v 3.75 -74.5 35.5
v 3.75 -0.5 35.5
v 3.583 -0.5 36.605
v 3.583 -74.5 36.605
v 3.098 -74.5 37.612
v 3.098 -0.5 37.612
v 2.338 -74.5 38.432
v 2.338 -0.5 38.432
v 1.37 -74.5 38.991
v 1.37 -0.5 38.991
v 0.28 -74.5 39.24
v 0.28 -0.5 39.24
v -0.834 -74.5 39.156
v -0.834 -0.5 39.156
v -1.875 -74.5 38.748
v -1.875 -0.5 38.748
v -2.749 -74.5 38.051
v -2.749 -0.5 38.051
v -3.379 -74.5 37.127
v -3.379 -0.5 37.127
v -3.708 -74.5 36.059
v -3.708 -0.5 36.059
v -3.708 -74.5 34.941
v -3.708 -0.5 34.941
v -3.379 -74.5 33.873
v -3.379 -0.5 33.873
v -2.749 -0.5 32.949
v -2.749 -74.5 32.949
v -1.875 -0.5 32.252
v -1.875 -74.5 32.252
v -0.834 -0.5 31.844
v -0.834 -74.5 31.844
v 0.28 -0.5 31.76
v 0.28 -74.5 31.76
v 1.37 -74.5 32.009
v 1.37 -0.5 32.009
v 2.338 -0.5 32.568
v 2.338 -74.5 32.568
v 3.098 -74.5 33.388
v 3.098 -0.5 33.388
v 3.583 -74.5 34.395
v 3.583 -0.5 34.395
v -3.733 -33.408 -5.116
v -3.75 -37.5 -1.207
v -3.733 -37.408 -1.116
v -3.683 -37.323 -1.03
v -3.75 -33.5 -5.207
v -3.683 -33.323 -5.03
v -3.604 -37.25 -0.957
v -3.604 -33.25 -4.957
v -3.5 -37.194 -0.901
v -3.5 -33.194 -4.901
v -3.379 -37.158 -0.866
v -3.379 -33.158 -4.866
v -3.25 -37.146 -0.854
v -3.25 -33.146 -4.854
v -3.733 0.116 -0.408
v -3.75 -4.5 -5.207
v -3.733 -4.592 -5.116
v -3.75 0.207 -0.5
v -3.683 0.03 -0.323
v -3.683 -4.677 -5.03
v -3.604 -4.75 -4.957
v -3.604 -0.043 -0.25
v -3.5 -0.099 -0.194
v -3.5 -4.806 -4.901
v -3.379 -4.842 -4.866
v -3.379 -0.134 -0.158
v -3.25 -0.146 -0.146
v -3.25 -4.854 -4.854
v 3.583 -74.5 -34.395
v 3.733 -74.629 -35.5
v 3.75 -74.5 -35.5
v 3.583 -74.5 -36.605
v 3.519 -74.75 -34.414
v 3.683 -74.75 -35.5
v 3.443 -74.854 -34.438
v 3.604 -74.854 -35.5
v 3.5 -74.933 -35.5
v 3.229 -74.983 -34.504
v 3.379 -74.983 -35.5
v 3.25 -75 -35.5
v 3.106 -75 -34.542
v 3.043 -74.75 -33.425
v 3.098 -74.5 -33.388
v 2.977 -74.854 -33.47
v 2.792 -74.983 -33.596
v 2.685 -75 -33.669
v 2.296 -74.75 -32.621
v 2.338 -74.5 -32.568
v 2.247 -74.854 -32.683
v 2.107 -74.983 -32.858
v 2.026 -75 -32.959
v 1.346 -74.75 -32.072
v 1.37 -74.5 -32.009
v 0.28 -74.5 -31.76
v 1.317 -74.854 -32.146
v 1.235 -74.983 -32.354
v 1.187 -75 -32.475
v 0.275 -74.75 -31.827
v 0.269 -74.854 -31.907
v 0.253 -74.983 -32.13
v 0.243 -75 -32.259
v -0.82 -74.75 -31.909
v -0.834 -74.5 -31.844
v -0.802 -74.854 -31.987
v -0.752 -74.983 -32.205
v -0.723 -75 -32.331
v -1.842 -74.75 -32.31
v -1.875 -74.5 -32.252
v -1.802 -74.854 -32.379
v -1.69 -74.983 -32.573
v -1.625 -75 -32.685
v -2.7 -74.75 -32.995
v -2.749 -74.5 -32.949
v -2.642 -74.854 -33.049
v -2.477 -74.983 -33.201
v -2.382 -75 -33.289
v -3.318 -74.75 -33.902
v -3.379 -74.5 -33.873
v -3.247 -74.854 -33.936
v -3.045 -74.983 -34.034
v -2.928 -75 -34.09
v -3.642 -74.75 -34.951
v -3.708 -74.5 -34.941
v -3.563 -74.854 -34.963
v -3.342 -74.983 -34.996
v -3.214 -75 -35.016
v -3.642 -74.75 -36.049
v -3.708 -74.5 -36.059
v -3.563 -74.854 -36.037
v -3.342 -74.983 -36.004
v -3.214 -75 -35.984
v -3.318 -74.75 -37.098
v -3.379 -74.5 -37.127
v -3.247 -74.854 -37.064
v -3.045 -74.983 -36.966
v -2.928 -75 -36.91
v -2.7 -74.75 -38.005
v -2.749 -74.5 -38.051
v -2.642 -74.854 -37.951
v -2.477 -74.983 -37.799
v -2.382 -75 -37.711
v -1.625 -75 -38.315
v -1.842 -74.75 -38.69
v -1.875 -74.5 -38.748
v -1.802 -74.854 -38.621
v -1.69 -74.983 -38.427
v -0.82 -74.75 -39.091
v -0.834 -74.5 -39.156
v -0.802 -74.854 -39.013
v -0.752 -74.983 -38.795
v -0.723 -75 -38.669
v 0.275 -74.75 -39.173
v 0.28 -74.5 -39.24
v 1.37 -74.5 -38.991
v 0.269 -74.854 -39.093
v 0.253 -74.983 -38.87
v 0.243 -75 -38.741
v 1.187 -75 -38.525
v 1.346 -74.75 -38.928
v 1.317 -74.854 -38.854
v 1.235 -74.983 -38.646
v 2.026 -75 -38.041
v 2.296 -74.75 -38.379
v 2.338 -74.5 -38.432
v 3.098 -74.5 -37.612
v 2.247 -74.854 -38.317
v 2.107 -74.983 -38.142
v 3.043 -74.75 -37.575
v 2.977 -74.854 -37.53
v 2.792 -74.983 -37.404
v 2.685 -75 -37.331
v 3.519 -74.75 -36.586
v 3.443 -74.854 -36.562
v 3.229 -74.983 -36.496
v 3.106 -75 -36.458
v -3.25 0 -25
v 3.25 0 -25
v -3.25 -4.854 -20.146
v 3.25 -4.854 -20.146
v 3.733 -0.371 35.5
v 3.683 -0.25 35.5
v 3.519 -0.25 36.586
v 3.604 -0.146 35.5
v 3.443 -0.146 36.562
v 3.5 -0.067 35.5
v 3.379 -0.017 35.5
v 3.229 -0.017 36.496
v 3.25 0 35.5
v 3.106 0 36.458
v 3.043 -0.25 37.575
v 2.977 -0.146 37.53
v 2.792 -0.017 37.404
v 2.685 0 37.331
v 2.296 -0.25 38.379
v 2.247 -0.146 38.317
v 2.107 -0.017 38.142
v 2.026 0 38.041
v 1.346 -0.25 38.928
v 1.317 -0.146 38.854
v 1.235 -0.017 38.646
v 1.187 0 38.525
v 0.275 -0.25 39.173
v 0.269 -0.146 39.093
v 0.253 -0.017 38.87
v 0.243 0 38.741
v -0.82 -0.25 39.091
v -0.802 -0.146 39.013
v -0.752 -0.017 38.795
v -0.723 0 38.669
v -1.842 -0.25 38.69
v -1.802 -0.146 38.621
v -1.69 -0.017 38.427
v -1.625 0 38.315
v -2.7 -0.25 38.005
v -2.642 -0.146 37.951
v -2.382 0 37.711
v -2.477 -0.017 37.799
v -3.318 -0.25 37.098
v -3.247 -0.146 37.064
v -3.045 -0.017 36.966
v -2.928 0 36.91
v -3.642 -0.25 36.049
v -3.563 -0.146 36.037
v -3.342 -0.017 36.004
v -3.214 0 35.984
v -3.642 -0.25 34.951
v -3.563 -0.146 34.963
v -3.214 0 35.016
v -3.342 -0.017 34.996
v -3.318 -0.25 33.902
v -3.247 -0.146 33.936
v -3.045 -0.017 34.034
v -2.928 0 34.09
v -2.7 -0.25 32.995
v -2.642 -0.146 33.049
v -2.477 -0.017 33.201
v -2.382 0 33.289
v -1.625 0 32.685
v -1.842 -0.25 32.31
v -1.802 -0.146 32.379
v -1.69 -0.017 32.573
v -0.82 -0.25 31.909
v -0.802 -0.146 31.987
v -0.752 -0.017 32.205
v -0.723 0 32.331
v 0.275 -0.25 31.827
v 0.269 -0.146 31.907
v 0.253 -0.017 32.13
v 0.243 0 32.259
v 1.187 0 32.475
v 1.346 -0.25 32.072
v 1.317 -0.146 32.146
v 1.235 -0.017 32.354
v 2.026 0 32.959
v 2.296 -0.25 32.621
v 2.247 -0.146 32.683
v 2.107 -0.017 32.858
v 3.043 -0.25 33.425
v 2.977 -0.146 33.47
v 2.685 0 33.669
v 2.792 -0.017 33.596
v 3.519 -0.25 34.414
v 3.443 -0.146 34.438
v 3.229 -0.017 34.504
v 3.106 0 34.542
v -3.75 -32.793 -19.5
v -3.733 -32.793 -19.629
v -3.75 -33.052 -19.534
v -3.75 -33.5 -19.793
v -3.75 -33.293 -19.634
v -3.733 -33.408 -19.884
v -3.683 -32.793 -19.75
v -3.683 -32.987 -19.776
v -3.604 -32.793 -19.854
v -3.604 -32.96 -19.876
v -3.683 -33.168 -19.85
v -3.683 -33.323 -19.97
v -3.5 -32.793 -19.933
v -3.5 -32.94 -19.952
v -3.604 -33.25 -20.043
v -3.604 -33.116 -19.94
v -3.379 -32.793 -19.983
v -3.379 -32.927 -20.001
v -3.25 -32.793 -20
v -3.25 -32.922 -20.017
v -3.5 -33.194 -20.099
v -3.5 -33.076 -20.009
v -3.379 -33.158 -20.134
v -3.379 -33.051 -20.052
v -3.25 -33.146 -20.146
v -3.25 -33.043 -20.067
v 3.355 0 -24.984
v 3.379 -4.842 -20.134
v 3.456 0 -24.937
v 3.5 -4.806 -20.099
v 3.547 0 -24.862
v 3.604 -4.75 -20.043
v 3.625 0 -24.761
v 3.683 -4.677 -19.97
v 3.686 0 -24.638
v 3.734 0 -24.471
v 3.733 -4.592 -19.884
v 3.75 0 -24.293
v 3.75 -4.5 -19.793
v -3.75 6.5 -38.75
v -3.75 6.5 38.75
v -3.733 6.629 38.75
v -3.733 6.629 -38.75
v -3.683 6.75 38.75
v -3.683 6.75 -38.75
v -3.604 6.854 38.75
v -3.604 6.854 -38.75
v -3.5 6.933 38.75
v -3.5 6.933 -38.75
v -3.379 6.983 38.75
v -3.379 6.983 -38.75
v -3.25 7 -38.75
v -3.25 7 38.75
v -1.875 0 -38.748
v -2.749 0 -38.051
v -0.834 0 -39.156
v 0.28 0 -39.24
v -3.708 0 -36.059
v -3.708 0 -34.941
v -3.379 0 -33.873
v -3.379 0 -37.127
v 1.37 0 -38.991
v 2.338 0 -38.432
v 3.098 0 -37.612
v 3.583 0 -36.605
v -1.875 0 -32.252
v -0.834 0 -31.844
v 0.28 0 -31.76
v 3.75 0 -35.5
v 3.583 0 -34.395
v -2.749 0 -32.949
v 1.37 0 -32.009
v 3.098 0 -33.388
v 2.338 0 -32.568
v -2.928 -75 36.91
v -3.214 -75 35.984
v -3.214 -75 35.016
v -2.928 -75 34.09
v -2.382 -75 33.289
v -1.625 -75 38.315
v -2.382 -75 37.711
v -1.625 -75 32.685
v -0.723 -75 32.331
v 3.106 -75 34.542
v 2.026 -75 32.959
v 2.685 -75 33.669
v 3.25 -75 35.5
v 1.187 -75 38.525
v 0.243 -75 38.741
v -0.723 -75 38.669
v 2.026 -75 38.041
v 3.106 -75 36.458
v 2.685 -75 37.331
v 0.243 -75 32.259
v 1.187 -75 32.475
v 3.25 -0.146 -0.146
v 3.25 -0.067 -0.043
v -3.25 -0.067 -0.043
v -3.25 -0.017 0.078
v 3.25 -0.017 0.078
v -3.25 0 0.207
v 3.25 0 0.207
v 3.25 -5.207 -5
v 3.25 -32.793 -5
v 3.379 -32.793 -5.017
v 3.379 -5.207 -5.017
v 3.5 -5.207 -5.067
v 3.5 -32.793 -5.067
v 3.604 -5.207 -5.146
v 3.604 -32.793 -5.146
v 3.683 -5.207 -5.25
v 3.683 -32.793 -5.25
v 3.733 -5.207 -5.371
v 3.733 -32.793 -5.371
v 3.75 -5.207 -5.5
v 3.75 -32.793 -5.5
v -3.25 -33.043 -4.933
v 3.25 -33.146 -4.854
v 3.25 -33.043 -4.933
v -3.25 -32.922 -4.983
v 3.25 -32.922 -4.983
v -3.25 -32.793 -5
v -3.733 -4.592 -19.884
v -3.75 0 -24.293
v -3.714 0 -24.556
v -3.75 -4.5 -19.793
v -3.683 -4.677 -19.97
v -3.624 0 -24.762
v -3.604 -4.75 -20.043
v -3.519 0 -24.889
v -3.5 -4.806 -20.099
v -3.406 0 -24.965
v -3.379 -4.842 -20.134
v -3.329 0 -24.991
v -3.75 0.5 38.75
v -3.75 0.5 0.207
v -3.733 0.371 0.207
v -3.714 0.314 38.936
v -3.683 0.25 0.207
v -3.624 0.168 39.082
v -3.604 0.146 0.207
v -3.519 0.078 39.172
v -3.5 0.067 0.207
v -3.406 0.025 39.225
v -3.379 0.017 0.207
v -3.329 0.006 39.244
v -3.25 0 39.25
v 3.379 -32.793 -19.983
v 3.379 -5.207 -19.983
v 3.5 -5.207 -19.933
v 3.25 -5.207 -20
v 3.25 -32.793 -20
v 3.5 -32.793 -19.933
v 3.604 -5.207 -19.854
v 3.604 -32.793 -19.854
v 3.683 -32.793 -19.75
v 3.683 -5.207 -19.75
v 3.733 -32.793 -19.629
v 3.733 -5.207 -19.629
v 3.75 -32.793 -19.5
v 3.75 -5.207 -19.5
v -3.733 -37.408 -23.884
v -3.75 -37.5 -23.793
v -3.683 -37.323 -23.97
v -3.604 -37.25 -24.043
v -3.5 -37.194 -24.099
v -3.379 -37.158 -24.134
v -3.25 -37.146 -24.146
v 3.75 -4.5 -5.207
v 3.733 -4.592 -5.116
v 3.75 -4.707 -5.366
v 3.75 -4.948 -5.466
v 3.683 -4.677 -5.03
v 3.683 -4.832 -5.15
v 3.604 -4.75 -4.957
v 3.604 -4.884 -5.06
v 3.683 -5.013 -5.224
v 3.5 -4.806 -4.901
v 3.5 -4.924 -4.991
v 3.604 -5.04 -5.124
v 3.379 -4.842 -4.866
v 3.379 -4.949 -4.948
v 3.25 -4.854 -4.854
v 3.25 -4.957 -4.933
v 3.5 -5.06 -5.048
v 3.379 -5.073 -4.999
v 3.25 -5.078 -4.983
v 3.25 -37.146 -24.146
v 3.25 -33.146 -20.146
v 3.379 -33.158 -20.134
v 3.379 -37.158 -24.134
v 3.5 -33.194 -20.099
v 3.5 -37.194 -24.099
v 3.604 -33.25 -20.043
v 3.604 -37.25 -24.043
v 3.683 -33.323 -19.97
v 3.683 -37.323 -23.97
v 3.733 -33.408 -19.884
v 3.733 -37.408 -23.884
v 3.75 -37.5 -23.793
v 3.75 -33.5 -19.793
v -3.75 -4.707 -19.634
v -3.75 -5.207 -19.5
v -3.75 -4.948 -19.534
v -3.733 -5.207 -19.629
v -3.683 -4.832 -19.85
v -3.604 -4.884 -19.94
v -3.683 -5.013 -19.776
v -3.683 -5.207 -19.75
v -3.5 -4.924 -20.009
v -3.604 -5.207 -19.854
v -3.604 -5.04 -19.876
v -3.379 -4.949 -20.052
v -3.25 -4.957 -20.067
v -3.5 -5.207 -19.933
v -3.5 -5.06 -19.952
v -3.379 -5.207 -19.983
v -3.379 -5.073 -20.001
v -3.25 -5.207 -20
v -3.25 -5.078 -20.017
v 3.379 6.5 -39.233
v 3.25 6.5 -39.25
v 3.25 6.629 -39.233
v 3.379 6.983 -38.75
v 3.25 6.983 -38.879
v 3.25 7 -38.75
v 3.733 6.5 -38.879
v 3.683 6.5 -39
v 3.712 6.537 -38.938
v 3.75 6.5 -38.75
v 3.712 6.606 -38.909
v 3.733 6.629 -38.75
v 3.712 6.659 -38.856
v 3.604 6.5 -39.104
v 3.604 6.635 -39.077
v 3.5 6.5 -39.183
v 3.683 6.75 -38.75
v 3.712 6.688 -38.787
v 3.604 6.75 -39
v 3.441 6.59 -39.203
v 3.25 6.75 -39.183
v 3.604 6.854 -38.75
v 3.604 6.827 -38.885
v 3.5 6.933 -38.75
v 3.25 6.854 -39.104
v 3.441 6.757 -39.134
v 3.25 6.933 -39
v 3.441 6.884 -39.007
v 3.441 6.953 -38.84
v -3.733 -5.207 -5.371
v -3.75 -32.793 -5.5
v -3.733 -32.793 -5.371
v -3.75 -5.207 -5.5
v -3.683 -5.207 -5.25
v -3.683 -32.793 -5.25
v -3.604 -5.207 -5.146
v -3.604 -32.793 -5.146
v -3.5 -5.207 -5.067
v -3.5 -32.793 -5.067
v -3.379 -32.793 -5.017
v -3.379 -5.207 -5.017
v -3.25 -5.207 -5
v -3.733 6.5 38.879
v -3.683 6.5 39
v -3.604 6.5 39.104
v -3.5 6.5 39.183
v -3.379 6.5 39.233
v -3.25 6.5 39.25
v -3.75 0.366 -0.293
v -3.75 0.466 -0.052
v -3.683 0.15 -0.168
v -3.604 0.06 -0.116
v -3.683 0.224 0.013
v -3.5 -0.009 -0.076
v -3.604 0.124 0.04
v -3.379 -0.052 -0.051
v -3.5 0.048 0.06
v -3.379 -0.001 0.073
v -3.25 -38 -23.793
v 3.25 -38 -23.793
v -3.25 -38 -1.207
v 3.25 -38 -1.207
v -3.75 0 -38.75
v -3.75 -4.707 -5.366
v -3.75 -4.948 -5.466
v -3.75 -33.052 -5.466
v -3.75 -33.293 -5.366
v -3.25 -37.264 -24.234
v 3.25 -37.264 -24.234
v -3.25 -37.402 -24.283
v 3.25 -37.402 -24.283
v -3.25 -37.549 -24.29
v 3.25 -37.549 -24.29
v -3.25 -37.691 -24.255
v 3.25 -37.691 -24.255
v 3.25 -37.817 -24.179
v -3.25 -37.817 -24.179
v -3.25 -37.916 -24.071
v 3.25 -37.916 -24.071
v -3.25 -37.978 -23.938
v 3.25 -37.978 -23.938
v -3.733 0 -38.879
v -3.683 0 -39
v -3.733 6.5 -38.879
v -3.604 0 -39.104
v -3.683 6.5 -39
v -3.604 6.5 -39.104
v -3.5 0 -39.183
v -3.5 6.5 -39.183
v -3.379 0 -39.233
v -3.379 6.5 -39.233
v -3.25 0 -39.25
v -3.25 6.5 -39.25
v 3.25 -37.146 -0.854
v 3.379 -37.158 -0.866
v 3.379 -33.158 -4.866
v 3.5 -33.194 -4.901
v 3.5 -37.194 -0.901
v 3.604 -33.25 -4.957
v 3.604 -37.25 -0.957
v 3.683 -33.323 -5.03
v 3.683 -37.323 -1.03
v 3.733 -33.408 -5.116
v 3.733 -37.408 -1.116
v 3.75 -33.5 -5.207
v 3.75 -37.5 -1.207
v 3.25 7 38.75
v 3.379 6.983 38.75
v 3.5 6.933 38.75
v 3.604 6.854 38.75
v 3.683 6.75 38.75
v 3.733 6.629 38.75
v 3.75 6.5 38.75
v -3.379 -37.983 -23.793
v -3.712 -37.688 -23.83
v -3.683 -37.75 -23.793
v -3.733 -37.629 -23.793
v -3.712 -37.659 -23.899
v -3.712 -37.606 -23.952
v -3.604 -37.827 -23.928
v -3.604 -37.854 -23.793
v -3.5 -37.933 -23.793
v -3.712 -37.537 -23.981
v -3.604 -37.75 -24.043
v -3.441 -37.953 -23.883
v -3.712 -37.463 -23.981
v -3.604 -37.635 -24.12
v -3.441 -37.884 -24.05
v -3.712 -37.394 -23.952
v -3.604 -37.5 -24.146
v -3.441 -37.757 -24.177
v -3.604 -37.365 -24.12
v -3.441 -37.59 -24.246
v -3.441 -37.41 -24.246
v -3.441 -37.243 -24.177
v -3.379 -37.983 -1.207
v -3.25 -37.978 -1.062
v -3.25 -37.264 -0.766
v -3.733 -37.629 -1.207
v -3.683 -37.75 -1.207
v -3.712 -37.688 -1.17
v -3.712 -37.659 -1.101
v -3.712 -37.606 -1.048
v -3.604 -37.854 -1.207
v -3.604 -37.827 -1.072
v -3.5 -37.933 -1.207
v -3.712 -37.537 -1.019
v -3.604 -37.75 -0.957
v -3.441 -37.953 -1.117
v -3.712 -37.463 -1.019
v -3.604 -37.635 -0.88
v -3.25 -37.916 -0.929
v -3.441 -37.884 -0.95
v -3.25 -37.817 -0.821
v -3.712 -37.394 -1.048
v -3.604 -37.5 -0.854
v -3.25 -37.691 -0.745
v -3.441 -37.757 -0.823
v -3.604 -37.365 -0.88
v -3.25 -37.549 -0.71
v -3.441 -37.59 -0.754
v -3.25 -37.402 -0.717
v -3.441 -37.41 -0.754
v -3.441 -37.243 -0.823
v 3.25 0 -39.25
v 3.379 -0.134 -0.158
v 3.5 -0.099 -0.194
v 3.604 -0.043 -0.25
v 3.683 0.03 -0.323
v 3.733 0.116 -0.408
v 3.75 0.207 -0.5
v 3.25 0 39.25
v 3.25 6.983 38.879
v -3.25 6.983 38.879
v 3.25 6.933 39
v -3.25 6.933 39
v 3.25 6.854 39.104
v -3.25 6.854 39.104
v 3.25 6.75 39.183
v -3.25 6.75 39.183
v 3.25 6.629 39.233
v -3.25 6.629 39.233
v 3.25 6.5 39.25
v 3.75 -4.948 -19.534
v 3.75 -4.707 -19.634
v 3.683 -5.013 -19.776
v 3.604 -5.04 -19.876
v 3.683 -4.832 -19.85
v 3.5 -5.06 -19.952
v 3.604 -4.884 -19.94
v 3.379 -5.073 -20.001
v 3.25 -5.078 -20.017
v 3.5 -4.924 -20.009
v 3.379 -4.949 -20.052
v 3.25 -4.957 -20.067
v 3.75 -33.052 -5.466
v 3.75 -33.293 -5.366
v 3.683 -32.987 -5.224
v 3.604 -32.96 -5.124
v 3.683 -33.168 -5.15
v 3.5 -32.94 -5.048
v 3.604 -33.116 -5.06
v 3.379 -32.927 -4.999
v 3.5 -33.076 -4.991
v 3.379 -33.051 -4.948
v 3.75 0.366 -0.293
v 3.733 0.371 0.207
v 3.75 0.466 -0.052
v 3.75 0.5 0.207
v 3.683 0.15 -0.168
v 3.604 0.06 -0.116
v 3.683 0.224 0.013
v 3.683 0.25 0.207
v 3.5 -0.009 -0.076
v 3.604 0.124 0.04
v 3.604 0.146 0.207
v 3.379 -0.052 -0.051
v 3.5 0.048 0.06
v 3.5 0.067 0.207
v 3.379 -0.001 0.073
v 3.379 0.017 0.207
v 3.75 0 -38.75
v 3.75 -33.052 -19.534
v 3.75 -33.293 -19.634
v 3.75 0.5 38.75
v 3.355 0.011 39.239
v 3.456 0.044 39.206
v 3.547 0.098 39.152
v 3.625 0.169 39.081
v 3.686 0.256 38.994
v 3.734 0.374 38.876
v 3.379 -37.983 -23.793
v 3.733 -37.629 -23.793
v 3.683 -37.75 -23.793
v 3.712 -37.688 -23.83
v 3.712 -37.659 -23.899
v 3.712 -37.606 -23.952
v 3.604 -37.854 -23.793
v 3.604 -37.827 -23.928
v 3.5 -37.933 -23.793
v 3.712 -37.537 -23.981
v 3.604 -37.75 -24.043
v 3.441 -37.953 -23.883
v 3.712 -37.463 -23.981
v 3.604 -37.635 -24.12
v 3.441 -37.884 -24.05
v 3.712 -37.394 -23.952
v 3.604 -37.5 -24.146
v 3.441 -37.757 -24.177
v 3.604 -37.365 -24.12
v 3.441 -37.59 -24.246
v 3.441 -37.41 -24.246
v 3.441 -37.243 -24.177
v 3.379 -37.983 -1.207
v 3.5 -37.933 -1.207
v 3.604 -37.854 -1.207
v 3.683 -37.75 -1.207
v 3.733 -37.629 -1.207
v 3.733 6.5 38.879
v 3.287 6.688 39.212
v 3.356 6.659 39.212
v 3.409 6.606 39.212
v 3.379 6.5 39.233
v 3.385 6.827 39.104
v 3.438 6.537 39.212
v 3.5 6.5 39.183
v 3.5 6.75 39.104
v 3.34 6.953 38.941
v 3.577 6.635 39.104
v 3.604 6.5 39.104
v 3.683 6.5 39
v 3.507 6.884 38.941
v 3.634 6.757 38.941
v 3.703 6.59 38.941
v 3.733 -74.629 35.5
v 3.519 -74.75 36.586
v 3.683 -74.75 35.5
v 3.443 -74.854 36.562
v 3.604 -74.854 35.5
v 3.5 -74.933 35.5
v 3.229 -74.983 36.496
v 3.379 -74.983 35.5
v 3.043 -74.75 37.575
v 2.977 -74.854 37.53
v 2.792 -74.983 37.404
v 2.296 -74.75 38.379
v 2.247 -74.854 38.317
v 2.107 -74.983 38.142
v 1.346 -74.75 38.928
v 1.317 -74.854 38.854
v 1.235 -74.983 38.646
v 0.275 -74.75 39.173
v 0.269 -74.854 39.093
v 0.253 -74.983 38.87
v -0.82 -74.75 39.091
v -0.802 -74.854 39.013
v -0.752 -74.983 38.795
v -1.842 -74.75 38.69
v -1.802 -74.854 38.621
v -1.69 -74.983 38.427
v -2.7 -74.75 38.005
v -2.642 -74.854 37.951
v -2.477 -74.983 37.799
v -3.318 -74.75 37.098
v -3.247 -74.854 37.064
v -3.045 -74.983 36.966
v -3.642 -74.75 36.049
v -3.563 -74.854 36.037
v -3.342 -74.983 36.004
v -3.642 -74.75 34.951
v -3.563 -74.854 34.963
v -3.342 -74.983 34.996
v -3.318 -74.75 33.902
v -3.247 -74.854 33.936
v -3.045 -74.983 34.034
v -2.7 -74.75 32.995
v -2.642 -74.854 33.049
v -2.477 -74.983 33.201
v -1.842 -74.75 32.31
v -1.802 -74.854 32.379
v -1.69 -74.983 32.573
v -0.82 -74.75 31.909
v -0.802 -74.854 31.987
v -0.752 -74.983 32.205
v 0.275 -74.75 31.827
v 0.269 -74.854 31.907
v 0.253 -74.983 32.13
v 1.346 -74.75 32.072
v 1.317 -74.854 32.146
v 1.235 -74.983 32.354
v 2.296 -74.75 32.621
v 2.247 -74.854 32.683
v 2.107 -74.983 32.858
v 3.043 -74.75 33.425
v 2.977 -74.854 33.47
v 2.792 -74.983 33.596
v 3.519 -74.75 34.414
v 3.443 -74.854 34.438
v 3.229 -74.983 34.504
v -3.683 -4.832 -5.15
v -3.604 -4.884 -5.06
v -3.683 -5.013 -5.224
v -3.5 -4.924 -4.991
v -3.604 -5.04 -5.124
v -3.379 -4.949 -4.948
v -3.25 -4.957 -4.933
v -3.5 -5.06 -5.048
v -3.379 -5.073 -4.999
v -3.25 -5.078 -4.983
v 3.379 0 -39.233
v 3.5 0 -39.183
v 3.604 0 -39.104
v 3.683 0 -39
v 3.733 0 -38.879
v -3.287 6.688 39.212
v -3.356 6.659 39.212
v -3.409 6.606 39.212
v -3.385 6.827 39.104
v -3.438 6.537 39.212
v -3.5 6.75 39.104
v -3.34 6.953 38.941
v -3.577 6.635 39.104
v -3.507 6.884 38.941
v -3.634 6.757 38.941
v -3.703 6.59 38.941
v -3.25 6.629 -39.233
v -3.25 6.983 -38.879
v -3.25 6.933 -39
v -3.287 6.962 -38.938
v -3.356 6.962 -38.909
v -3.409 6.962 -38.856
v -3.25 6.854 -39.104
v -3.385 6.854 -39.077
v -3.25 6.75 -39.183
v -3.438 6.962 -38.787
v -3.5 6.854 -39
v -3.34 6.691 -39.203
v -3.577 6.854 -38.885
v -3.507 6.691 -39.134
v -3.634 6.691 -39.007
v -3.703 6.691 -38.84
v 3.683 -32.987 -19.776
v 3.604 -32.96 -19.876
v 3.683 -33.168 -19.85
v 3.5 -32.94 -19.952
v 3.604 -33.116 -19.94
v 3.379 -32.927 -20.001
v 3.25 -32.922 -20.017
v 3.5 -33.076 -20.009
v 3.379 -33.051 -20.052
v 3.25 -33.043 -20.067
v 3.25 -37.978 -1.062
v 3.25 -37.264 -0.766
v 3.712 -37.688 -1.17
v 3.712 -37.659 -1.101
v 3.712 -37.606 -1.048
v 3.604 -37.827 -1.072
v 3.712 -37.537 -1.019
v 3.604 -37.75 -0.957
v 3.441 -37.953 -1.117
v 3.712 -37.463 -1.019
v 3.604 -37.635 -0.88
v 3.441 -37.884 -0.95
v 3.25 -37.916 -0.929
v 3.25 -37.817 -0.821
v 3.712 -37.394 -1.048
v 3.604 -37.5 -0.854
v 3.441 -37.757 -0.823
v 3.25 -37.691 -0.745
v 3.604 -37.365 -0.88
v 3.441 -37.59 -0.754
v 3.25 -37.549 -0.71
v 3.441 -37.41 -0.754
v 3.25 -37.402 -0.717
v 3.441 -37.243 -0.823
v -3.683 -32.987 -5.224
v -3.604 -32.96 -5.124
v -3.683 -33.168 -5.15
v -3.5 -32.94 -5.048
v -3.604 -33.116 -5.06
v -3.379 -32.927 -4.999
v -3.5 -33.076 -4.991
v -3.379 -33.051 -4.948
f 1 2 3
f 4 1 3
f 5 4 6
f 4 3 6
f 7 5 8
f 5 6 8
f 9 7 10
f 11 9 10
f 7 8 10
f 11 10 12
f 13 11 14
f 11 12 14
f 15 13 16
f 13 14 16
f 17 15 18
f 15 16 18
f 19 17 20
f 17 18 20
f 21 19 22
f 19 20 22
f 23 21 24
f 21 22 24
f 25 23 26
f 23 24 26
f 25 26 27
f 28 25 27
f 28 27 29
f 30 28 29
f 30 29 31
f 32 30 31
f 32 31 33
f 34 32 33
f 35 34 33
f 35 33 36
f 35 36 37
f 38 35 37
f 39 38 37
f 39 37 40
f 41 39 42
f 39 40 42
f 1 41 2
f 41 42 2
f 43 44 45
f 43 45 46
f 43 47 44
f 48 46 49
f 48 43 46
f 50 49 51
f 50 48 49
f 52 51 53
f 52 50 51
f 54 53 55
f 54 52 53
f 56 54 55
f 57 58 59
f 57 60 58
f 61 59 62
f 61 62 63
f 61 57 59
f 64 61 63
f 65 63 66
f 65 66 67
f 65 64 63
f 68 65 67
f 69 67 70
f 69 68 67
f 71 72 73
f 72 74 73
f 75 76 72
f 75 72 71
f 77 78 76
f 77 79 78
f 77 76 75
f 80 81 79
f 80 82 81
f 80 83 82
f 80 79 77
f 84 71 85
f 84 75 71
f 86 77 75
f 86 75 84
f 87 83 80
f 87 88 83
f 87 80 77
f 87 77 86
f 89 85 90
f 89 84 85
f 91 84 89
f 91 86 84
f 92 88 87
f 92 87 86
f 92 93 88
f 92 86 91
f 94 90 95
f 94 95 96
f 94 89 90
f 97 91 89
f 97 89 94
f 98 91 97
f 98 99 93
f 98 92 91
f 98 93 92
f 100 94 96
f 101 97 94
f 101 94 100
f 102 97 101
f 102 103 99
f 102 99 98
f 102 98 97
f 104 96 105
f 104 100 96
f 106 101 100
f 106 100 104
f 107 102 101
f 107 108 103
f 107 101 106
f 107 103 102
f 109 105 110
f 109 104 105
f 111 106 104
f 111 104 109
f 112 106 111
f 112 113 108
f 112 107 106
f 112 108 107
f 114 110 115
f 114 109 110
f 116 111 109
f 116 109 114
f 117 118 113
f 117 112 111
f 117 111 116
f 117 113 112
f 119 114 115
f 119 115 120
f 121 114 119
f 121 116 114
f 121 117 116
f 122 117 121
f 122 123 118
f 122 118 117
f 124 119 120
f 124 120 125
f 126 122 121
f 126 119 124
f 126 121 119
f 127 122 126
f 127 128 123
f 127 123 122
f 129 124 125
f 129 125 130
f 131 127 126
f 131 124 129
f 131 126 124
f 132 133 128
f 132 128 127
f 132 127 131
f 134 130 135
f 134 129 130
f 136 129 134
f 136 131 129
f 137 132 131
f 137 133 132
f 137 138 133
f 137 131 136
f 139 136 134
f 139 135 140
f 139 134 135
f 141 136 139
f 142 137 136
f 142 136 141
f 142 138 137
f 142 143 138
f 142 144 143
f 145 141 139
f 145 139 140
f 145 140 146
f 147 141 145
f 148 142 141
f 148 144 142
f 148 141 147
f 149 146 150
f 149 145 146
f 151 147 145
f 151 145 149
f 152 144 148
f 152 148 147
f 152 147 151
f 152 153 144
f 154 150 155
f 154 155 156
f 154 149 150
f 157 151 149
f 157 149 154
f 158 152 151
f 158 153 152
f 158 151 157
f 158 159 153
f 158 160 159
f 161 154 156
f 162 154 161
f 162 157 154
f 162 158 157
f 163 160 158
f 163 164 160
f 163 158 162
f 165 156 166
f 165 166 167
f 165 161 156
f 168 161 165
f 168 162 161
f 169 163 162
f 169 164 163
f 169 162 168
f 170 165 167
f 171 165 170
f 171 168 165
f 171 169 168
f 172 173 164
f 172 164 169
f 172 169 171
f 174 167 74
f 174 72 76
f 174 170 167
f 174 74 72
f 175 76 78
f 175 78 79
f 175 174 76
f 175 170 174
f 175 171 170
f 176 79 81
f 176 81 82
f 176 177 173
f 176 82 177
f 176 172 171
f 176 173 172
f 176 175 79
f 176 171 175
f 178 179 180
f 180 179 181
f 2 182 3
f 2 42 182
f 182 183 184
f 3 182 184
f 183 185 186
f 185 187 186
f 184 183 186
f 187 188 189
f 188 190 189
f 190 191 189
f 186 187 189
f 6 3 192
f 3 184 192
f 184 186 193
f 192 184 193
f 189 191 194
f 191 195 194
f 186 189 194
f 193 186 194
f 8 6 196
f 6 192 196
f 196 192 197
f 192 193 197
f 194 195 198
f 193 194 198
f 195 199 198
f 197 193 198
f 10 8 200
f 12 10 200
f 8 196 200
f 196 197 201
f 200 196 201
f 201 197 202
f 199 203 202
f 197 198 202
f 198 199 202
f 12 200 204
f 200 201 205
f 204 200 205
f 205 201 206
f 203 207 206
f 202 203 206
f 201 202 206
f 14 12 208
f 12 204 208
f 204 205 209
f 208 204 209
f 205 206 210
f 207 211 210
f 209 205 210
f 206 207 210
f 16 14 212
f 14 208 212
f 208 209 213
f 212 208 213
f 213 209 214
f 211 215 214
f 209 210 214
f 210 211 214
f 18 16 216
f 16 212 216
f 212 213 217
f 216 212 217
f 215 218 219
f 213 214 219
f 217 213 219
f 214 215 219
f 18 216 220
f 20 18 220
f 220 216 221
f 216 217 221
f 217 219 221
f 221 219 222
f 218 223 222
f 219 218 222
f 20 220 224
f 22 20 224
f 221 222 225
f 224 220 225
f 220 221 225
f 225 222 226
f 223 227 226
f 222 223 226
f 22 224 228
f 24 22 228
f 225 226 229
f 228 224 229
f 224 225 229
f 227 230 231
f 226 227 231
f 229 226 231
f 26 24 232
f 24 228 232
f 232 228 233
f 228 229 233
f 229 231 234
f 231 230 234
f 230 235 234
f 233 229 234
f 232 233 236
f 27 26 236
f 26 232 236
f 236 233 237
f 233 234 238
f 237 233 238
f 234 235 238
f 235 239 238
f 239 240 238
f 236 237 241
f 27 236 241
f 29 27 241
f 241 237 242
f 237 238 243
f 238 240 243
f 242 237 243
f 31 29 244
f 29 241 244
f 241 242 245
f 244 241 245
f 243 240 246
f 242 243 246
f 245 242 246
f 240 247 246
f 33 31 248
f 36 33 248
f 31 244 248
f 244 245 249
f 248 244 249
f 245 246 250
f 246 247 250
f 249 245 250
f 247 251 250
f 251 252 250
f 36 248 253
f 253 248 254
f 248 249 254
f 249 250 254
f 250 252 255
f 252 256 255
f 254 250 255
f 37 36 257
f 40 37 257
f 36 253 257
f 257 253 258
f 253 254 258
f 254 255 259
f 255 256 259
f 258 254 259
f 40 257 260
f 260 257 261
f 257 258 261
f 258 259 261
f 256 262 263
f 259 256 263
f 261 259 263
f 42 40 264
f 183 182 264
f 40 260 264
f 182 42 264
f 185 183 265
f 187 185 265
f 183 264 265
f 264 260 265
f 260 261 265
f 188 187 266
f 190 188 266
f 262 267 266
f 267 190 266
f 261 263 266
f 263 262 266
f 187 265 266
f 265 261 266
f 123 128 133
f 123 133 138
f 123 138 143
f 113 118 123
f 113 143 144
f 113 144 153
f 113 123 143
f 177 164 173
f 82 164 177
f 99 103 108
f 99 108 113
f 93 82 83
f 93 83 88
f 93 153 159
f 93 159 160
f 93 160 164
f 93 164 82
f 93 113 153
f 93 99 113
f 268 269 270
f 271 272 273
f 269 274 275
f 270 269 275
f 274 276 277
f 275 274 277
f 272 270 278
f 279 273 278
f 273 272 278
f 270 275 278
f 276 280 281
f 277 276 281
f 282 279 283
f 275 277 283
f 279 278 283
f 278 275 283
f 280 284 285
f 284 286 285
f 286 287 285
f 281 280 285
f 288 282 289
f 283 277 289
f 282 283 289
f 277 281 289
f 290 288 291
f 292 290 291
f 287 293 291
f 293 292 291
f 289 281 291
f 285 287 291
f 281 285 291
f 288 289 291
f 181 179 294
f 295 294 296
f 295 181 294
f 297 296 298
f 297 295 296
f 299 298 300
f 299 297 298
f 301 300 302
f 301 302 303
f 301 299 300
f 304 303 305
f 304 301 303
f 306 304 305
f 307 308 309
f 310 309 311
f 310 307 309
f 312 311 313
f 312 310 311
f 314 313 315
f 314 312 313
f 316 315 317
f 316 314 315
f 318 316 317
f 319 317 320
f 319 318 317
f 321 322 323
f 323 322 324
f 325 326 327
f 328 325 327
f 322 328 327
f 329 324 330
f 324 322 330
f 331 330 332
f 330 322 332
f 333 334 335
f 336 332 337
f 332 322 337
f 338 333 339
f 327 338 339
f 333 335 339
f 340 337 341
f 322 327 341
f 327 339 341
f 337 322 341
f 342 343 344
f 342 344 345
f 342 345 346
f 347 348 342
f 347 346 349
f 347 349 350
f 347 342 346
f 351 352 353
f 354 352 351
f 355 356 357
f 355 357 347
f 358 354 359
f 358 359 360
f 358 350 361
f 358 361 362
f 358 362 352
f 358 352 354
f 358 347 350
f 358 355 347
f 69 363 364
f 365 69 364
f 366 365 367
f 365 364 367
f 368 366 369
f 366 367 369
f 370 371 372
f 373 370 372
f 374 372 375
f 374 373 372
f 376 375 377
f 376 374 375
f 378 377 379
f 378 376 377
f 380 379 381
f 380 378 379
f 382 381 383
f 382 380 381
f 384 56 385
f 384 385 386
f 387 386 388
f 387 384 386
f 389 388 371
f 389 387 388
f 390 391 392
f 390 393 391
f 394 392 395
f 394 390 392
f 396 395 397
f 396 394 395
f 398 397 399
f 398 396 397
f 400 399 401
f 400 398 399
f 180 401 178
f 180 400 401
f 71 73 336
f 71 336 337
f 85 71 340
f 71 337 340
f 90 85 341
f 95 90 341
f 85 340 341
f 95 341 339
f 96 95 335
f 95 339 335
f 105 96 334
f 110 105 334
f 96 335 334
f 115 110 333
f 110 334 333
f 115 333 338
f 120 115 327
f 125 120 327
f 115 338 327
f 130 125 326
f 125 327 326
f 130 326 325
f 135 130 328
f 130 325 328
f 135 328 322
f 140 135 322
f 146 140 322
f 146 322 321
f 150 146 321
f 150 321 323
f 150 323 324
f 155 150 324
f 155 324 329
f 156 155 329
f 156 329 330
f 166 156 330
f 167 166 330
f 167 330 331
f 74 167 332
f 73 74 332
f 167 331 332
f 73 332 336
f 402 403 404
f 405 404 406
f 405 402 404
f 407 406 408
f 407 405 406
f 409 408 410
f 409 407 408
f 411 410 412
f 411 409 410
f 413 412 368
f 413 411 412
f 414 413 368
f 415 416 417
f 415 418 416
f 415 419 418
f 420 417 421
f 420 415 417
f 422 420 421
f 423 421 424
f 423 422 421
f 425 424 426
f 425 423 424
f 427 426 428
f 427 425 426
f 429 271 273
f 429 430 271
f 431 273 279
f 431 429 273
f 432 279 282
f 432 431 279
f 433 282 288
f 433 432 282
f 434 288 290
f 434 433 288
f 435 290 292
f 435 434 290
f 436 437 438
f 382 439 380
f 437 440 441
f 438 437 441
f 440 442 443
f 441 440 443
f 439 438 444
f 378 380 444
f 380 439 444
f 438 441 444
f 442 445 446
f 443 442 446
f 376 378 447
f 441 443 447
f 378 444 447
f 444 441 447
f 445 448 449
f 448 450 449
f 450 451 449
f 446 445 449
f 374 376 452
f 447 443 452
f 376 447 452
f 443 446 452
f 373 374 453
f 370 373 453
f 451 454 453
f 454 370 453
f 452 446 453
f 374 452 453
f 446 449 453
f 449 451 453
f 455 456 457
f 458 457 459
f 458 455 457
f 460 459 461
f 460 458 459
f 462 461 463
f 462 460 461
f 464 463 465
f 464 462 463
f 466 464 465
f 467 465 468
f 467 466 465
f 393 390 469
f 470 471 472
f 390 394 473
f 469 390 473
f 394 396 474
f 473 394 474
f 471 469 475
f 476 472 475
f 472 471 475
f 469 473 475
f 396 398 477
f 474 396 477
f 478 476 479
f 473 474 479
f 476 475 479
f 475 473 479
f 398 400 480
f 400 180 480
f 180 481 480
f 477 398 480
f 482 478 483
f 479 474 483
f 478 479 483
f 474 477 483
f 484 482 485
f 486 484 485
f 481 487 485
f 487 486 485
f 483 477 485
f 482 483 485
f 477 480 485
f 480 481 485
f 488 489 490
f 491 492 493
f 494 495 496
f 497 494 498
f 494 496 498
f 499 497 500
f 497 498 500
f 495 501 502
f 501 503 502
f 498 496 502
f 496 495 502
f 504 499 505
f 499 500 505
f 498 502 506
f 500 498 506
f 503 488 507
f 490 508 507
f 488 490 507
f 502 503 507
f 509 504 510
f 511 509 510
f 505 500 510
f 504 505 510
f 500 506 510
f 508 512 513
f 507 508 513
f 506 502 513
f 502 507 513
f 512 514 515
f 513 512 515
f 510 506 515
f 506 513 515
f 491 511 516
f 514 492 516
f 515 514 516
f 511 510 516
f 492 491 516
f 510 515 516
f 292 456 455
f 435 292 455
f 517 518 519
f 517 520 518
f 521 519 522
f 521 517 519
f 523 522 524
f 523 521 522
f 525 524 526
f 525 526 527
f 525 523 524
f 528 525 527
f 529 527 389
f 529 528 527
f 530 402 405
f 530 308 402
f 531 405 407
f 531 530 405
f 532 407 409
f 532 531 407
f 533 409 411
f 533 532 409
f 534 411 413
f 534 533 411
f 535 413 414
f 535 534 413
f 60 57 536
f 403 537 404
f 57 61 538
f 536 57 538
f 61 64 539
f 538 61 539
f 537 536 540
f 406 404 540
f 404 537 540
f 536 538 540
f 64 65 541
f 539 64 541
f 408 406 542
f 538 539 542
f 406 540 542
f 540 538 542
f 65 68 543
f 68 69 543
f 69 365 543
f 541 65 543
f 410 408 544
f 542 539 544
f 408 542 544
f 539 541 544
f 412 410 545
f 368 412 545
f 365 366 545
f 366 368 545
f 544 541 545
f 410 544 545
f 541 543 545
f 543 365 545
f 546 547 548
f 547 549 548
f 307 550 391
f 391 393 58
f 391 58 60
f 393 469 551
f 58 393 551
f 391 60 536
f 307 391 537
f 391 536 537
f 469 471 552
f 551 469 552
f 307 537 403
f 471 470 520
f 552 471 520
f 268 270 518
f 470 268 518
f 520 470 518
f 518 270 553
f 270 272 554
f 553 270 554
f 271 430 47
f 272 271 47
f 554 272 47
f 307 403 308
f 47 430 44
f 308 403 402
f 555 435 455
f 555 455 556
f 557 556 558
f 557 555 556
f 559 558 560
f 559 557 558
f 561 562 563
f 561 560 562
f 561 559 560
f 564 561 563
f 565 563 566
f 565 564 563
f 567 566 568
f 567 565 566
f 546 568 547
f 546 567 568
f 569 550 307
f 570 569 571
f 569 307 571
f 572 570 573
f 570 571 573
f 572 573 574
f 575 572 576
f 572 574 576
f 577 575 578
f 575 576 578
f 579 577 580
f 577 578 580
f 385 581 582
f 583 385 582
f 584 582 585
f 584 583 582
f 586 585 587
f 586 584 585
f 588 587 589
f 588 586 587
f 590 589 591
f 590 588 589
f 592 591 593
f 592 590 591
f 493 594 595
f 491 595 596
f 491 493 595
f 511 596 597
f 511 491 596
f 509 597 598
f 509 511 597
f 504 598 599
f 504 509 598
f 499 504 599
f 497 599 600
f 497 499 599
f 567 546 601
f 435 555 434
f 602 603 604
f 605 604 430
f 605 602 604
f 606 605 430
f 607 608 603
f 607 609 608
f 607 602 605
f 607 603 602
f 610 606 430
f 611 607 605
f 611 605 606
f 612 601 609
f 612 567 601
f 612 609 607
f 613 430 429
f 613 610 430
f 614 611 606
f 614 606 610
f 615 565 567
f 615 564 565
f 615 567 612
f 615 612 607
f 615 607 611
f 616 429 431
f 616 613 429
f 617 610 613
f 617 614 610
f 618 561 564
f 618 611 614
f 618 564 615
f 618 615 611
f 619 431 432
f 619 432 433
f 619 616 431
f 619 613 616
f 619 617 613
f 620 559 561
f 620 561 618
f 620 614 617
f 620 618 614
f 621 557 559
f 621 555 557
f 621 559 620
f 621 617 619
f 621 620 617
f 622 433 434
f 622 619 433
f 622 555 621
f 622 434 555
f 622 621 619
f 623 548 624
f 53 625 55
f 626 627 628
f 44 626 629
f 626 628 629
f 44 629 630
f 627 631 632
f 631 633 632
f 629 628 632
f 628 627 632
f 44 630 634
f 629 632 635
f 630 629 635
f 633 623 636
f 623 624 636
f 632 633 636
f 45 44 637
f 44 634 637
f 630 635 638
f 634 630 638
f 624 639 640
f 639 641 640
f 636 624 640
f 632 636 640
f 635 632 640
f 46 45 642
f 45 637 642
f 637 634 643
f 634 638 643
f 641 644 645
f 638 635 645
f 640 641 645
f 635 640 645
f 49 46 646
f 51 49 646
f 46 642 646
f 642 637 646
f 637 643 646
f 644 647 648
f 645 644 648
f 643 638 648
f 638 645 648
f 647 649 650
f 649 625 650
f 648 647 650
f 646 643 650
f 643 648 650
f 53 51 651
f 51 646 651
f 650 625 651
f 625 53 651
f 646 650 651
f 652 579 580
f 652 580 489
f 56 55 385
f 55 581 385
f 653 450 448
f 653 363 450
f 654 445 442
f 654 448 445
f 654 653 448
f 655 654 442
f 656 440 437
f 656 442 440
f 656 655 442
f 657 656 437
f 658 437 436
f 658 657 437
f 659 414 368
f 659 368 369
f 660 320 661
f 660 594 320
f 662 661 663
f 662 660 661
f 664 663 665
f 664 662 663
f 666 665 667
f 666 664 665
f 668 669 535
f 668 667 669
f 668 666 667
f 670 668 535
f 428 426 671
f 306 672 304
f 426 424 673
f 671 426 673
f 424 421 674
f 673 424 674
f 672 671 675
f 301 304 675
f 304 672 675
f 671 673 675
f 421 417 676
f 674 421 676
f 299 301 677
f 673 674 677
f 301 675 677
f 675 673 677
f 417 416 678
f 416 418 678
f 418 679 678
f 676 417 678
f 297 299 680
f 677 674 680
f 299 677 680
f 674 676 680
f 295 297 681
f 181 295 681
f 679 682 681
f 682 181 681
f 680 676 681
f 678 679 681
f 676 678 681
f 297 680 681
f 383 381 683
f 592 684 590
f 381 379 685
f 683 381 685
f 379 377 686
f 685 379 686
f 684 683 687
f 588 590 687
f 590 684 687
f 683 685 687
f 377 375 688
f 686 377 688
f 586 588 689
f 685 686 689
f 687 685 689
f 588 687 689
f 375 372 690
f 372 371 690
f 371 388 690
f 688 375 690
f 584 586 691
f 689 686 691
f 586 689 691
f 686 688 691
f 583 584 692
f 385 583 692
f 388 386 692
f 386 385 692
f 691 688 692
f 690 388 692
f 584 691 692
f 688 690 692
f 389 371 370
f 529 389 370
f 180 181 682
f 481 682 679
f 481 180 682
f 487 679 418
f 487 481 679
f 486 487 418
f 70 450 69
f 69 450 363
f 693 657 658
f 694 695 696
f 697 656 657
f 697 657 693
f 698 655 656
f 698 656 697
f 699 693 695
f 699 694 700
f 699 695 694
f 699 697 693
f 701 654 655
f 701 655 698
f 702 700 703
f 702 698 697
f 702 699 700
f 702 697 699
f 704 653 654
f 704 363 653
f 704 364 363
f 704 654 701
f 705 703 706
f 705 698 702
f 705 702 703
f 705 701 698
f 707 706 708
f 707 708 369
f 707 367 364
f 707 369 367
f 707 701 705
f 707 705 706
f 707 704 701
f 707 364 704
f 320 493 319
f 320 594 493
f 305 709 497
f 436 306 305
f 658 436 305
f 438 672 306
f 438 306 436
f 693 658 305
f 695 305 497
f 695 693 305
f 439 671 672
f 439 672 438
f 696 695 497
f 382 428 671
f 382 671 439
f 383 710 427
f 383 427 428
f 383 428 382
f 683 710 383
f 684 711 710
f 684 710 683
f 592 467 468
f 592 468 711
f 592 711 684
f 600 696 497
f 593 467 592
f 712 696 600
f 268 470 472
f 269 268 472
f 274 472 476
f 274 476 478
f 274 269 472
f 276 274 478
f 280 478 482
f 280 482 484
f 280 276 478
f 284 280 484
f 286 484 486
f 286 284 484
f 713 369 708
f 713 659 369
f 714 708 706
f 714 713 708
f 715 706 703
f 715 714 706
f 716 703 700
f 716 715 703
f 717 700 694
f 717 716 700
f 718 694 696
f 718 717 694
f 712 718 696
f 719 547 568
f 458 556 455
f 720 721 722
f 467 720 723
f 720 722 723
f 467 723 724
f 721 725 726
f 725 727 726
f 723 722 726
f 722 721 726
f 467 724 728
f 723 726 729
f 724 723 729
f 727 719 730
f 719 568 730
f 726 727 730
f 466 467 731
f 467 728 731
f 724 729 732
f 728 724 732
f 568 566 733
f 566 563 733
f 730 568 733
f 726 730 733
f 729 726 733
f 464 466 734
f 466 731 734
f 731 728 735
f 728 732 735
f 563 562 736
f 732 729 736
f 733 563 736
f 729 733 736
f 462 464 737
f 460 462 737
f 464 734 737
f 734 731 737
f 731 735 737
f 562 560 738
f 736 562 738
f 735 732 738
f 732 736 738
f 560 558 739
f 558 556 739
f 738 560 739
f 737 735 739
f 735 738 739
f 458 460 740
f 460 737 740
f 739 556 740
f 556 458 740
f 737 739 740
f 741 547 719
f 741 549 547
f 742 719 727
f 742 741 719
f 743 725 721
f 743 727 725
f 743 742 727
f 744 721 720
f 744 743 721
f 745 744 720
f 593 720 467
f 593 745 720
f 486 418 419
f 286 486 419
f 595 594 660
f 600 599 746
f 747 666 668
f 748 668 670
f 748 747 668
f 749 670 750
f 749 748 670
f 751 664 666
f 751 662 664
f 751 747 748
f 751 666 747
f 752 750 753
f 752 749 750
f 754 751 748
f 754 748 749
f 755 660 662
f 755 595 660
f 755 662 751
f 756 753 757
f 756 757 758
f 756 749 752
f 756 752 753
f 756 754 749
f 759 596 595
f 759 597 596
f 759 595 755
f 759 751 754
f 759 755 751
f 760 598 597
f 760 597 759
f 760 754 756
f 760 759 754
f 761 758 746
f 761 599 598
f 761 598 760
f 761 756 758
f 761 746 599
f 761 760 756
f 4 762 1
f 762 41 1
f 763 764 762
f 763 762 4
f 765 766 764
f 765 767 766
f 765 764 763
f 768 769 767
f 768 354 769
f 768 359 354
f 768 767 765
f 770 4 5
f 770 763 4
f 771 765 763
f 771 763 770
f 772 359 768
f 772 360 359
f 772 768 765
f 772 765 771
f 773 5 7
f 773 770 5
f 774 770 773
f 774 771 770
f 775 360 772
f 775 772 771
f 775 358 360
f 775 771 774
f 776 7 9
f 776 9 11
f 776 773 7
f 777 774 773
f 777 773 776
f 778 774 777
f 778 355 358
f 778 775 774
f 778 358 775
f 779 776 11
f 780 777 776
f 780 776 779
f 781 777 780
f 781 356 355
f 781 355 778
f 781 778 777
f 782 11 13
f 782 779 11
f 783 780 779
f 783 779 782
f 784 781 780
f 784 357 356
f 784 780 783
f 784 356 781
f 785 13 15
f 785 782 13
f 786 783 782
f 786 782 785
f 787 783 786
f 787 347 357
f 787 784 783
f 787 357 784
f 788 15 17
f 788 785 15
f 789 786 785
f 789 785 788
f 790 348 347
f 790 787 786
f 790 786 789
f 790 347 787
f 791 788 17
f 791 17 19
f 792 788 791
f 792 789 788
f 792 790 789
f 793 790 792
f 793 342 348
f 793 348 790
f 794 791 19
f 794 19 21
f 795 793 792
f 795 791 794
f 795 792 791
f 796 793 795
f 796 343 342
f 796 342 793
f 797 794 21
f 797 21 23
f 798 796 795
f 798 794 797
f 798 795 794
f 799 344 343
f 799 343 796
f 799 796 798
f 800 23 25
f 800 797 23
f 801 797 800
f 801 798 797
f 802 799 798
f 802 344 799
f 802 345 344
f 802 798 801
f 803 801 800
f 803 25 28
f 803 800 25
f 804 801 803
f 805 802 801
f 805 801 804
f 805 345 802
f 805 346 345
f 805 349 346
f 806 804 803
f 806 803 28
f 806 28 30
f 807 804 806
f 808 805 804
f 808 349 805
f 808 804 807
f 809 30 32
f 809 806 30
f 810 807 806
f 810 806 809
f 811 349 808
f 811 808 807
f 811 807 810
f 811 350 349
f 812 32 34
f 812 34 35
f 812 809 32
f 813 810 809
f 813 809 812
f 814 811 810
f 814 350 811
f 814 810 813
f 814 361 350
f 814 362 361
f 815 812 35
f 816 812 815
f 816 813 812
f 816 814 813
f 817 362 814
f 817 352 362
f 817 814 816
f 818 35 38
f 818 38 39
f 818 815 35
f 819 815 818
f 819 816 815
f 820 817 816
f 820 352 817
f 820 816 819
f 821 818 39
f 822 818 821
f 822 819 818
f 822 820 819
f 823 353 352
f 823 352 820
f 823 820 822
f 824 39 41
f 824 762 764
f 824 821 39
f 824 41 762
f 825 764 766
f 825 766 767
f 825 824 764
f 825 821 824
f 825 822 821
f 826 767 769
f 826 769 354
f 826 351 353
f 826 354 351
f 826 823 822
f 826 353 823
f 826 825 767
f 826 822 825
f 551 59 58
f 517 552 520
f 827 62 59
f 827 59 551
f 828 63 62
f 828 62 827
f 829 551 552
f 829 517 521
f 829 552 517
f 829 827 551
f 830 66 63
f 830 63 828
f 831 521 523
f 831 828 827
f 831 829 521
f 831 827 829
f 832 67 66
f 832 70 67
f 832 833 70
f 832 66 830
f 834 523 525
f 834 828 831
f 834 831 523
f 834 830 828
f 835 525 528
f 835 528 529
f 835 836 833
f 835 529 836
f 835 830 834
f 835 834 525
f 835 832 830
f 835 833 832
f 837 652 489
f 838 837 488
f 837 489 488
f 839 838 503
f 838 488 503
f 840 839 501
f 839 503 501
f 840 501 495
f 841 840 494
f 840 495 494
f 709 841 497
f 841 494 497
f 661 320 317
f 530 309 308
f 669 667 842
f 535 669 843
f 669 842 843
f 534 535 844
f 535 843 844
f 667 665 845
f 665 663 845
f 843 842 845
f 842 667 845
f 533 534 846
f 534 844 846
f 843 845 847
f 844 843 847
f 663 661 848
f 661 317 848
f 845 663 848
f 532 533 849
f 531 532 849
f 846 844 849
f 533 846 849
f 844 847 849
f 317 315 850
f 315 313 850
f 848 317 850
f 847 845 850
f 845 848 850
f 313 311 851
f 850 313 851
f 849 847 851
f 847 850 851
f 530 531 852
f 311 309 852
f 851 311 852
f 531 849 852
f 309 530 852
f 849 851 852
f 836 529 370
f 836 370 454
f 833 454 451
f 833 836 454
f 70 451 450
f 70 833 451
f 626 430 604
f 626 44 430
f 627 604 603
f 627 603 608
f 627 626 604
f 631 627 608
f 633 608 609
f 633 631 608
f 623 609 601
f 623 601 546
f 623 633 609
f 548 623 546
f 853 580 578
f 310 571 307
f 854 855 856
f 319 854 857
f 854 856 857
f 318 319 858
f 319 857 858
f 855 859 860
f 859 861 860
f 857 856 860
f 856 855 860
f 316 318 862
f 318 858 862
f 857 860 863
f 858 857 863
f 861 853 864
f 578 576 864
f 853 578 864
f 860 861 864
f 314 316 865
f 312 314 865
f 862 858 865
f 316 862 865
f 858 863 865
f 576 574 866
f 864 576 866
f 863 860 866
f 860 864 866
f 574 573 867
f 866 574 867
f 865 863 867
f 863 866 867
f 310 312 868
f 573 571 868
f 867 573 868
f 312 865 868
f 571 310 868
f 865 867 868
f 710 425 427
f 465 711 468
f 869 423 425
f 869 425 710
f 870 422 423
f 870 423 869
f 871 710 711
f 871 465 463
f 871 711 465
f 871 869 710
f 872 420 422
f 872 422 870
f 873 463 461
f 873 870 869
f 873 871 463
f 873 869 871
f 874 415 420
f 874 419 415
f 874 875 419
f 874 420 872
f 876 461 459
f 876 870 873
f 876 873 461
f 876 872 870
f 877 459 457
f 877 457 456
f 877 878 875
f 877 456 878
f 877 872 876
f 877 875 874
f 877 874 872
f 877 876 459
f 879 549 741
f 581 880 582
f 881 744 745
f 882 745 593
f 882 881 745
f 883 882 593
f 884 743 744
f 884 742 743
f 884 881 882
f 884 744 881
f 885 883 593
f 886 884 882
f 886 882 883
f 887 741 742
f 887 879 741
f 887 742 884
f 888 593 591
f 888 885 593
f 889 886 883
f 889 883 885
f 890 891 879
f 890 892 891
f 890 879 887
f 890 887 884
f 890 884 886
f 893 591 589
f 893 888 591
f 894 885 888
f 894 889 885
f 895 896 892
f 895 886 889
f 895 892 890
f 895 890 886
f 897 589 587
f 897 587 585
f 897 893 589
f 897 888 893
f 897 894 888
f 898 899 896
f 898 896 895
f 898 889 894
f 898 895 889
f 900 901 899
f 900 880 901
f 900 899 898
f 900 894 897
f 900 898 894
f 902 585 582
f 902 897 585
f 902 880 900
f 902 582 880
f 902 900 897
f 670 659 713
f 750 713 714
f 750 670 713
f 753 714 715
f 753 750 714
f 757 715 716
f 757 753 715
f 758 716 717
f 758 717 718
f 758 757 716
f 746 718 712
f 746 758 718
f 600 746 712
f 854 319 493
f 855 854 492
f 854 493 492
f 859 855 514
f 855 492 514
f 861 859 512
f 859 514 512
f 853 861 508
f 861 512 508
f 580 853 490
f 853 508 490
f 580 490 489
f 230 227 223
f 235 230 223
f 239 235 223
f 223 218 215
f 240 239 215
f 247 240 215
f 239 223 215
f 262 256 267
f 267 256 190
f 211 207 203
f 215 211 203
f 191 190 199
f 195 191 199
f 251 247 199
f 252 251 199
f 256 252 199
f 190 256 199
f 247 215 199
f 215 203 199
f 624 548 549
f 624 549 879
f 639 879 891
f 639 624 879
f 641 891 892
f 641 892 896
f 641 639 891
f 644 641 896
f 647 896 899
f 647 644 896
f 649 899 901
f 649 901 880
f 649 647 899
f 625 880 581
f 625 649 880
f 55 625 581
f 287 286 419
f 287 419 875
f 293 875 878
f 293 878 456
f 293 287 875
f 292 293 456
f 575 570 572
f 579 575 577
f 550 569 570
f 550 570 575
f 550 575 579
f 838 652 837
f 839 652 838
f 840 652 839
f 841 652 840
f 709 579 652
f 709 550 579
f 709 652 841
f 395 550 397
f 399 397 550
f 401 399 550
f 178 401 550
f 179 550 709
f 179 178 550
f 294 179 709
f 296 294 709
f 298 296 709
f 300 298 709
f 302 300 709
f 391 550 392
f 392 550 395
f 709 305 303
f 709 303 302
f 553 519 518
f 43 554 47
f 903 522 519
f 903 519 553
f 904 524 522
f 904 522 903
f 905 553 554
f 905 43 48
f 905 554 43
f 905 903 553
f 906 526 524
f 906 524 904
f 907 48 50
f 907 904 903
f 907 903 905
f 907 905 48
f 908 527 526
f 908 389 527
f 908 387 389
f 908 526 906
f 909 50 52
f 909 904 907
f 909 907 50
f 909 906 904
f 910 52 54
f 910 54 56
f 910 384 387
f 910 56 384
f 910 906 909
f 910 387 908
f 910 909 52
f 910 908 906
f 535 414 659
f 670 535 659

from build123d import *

# Parameters (mm, degrees)
F0_R     = 3.75
F1_DEPTH = 75
F2_W     = 7.5
F2_H     = 78.5
F3_DEPTH = 7
F4_W     = 7.5
F4_H     = 25
F5_DEPTH = 45
F7_DEPTH = 25
F8_R     = 0.5
F8_2_R   = 0.5
F8_3_R   = 0.5


with BuildPart() as f1:
    # F0 (on Front) → F1 (new body)
    with BuildSketch(Plane.XZ):
        with Locations((0, 35.5)):
            Circle(F0_R)
    extrude(amount=F1_DEPTH)

    # F8
    f8_edges = [f1.edges().sort_by_distance(p)[0] for p in [
        (-3.75, -75, 35.5),
        (3.75, -37.5, 35.5),
        (-3.75, 0, 35.5),
    ]]
    fillet(f8_edges, radius=F8_R)


with BuildPart() as f1b:
    # F0 (on Front) → F1, piece 2 (new body)
    with BuildSketch(Plane.XZ):
        with Locations((0, -35.5)):
            Circle(F0_R)
    extrude(amount=F1_DEPTH)

    # F8#2
    f8_2_edges = [f1b.edges().sort_by_distance(p)[0] for p in [
        (-3.75, -75, -35.5),
    ]]
    fillet(f8_2_edges, radius=F8_2_R)


with BuildPart() as f3:
    # F2 (on Front) → F3 (new body)
    with BuildSketch(Plane.XZ):
        Rectangle(F2_W, F2_H)
    extrude(amount=-F3_DEPTH)

    # F4 (on face) → F5 (join)
    with BuildSketch(Plane(origin=(0, 7, 0), x_dir=(-1, 0, 0), z_dir=(0, 1, 0))):
        with Locations((0, -12.5)):
            Rectangle(F4_W, F4_H)
    extrude(amount=-F5_DEPTH)

    # F6 (on face) → F7 (cut)
    with BuildSketch(Plane.YZ.offset(3.75)):
        Polygon((0, 0), (-38, 0), (-33, -5), (-5, -5), align=None)
        Polygon((-33, -20), (-38, -25), (0, -25), (-5, -20), align=None)
    extrude(amount=-F7_DEPTH, mode=Mode.SUBTRACT)

    # F8#3
    f8_3_edges = [f3.edges().sort_by_distance(p)[0] for p in [
        (-3.75, 3.5, -39.25),
        (0, 7, -39.25),
        (3.75, 3.5, -39.25),
        (-3.75, 7, 0),
        (3.75, 7, 0),
        (3.75, -19, -20),
        (3.75, -2.5, -22.5),
        (-3.75, -2.5, -22.5),
        (-3.75, -19, -20),
        (0, -5, -20),
        (0, 0, 0),
        (0, -5, -5),
        (3.75, -2.5, -2.5),
        (3.75, -19, -5),
        (-3.75, -2.5, -2.5),
        (-3.75, 0, 19.625),
        (-3.75, -35.5, -2.5),
        (0, 7, 39.25),
        (3.75, 3.5, 39.25),
        (-3.75, 3.5, 39.25),
        (0, -38, -25),
        (0, -38, 0),
        (3.75, -38, -12.5),
        (-3.75, -38, -12.5),
        (3.75, -35.5, -22.5),
        (-3.75, -35.5, -22.5),
        (0, -33, -20),
        (3.75, -35.5, -2.5),
        (0, -33, -5),
        (3.75, 0, 19.625),
        (-3.75, -19, -5),
    ]]
    fillet(f8_3_edges, radius=F8_3_R)


solid = Compound([f1.part, f1b.part, f3.part])
